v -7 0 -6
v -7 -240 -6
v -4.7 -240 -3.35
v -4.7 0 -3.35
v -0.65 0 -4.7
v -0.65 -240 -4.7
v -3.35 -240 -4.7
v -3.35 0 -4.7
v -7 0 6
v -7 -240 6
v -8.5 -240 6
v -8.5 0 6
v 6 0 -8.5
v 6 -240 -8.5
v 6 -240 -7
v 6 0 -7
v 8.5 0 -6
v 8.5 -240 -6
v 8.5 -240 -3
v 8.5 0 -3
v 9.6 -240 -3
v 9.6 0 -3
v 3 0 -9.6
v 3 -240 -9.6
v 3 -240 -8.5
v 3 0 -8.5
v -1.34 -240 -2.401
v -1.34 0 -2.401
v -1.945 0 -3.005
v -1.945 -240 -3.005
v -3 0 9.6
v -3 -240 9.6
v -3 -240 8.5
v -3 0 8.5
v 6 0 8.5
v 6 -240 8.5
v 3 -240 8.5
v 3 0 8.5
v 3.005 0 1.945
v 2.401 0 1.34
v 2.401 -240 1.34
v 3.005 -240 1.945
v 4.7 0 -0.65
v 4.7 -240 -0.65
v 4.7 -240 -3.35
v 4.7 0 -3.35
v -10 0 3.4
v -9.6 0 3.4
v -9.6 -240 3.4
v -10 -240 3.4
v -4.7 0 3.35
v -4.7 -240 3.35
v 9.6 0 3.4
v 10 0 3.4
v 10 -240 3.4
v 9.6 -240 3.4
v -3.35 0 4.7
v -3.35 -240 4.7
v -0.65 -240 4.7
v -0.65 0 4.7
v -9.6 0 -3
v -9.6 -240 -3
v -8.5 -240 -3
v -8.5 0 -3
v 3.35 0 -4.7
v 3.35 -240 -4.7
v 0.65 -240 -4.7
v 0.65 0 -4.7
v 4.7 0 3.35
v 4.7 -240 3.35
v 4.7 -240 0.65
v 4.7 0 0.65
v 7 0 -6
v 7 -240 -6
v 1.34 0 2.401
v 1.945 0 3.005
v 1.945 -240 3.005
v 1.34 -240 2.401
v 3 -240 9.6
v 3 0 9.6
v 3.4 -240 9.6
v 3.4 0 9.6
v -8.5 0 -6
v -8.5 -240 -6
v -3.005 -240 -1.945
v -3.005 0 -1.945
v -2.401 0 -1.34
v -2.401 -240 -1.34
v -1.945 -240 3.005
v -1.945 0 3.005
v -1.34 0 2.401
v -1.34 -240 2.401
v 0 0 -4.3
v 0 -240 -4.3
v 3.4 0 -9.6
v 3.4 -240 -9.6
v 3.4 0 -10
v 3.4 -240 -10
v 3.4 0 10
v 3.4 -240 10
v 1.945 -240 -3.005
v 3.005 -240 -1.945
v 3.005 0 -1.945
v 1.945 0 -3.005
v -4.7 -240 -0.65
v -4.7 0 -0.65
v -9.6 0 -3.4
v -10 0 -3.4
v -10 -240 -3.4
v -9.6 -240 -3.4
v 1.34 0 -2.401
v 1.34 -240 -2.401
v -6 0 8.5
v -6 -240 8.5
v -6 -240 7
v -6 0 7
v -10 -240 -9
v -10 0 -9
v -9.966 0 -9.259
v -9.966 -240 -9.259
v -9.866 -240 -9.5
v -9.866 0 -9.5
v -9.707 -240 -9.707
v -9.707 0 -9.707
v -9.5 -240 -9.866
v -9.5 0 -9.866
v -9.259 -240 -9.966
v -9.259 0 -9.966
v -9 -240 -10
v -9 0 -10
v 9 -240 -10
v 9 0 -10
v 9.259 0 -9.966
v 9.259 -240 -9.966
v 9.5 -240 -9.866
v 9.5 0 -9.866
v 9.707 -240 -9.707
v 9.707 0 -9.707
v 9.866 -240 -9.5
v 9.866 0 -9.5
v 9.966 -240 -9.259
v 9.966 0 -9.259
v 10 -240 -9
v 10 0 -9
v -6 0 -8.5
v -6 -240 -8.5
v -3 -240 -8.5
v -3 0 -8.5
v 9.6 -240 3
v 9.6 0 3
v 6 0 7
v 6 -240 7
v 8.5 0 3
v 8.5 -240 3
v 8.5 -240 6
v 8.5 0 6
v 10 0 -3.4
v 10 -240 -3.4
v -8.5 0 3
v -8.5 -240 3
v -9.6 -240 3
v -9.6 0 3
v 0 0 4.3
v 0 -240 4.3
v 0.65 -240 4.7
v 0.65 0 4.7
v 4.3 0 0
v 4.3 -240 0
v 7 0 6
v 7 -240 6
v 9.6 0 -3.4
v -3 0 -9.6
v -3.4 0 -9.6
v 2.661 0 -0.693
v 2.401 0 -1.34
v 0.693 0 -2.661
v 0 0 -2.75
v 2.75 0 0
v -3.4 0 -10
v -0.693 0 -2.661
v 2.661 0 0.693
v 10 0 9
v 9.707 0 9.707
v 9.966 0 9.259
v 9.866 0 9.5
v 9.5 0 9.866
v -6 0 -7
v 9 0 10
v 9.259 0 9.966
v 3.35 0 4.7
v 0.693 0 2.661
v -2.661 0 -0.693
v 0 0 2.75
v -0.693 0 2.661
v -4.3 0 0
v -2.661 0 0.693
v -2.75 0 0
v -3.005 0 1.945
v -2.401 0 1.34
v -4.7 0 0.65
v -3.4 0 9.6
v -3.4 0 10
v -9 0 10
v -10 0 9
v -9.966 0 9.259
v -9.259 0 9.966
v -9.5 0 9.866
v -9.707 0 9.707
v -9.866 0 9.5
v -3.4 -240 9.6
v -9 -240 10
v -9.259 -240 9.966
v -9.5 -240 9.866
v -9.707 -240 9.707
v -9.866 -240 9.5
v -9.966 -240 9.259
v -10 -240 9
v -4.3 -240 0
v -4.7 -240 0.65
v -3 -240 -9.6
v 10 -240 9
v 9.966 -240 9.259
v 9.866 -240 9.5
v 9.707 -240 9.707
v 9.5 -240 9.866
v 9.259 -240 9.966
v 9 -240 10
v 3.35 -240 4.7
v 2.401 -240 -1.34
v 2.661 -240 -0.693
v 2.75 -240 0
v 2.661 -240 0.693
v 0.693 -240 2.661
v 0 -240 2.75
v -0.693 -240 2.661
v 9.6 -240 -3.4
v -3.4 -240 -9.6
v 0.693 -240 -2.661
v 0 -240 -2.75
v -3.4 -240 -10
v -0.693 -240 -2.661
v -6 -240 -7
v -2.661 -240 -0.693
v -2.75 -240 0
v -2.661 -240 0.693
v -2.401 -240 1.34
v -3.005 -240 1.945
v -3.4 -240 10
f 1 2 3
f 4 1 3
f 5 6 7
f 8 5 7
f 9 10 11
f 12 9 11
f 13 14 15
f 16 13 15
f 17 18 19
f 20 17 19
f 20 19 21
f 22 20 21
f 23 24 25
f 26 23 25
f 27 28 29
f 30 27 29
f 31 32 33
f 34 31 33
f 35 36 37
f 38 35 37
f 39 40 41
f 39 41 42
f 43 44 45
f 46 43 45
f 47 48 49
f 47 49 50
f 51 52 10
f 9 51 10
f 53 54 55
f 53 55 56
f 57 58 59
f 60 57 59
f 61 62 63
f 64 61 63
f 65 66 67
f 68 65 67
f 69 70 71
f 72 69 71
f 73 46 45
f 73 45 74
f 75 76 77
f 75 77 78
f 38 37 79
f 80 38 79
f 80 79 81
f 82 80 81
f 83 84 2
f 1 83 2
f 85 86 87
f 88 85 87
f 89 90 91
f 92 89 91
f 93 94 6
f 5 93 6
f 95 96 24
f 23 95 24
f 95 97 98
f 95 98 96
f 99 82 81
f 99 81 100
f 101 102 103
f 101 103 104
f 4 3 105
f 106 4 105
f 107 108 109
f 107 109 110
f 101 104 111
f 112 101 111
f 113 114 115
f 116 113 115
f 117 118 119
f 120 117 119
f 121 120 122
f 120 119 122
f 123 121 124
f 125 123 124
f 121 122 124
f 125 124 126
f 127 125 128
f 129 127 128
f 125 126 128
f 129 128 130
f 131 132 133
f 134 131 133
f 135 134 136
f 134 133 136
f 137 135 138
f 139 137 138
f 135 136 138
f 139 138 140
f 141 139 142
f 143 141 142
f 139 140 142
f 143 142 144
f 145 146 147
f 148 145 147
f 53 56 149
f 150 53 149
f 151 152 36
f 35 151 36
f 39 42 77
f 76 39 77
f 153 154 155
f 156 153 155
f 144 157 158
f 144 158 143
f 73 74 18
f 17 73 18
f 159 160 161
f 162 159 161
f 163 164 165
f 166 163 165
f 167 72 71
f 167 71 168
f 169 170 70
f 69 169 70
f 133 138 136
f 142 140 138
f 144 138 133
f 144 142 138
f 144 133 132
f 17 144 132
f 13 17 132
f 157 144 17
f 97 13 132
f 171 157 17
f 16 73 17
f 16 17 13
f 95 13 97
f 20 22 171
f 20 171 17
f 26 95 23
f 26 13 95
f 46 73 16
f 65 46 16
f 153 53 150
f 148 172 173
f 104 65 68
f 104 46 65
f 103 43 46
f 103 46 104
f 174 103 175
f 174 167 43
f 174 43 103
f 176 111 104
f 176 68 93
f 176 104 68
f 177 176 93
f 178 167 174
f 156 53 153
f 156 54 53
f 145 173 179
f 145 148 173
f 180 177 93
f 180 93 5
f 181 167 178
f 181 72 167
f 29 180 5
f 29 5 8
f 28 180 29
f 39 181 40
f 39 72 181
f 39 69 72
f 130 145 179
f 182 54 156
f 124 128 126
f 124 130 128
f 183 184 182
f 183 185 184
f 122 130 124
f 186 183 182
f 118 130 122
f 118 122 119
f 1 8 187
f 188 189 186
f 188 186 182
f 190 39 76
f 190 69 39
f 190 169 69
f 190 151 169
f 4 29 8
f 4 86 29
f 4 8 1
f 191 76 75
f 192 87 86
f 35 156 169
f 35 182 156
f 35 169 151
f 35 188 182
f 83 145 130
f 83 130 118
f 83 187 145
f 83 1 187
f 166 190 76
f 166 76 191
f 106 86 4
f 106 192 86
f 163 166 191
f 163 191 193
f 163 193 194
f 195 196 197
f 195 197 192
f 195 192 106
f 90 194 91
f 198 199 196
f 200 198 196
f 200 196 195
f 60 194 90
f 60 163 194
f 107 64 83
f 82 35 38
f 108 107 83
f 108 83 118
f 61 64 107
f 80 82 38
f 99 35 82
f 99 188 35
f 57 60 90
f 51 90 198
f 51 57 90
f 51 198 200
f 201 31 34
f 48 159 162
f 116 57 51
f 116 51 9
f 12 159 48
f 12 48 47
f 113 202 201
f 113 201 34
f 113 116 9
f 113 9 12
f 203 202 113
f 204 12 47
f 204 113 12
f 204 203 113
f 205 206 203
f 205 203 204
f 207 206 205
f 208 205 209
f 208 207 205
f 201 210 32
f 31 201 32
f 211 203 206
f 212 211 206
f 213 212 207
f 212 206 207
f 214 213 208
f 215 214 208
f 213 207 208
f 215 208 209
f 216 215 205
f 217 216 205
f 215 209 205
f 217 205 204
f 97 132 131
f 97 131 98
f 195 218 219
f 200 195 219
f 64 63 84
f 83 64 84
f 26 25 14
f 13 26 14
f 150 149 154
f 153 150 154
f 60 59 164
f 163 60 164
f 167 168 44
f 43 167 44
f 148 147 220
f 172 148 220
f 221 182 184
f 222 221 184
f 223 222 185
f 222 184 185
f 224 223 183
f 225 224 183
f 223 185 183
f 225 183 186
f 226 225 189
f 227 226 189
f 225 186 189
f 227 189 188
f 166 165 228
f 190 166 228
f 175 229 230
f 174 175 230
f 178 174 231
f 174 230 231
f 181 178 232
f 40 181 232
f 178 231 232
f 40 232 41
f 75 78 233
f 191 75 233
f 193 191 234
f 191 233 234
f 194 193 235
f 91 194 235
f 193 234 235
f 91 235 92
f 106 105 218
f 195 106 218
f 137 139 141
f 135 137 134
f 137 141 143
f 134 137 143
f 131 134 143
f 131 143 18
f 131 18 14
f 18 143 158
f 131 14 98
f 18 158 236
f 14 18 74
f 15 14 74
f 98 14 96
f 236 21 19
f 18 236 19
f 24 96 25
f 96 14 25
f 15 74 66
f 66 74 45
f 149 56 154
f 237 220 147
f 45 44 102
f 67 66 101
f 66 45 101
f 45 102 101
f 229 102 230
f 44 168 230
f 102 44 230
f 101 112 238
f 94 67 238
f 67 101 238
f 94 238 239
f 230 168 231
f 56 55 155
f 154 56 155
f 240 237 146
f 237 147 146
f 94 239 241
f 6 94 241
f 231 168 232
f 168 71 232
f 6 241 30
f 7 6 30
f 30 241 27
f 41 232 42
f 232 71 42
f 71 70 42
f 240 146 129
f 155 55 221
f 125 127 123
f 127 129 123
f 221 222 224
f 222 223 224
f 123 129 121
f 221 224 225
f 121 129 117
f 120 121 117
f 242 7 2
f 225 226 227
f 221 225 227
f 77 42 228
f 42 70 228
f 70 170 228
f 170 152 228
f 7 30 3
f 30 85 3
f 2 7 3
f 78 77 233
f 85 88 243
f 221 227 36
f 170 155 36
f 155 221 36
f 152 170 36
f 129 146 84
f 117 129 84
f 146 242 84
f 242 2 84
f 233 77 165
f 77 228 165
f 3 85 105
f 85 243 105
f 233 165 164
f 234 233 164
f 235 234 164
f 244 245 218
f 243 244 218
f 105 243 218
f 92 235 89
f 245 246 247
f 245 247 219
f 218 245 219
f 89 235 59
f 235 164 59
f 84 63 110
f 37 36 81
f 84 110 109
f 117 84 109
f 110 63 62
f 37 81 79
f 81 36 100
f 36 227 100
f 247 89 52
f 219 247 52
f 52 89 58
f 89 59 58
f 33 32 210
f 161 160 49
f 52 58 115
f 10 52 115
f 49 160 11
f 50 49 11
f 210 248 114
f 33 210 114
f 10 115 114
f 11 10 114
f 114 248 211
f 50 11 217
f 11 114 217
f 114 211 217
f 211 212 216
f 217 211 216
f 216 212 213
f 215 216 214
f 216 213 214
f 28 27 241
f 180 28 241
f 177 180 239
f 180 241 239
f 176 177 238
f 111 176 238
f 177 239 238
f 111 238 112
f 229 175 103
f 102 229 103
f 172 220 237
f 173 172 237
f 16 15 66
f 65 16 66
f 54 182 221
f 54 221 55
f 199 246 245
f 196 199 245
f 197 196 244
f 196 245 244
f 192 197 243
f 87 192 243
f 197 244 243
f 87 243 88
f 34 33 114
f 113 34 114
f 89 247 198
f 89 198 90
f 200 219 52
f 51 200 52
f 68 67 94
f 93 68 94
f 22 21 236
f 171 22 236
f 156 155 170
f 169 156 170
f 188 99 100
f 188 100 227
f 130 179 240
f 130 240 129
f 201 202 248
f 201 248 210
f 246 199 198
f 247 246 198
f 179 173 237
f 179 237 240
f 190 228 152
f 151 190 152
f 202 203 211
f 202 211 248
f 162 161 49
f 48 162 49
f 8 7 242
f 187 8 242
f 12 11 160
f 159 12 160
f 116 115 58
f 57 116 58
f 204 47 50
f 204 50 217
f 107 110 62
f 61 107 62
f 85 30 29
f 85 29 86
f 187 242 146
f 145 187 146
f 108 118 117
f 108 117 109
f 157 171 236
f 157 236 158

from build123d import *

# Parameters (mm, degrees)
PAD_DEPTH          = 240
POCKET_DEPTH       = 380
POLARPATTERN_COUNT = 4
POCKET001_DEPTH    = 380


with BuildPart() as part:
    # Sketch → Pad (new body)
    with BuildSketch(Plane.XZ):
        with BuildLine():
            Line((-9, 10), (9, 10))
            ThreePointArc((10, 9), (9.707107, 9.707107), (9, 10))
            Line((10, 9), (10, -9))
            ThreePointArc((9, -10), (9.707107, -9.707107), (10, -9))
            Line((9, -10), (-9, -10))
            ThreePointArc((-10, -9), (-9.707107, -9.707107), (-9, -10))
            Line((-10, -9), (-10, 9))
            ThreePointArc((-9, 10), (-9.707107, 9.707107), (-10, 9))
        make_face()
    extrude(amount=PAD_DEPTH)

    # Sketch001 (on Face10 of Pad) → Pocket (cut)
    with BuildSketch(Plane.XZ.offset(240)):
        Polygon((-3.4, 10), (-3.4, 9.6), (-3, 9.6), (-3, 8.5), (-6, 8.5), (-6, 7), (-3.35, 4.7), (-0.65, 4.7), (0, 4.3), (0.65, 4.7), (3.35, 4.7), (6, 7), (6, 8.5), (3, 8.5), (3, 9.6), (3.4, 9.6), (3.4, 10), align=None)
    pocket = extrude(amount=-POCKET_DEPTH, mode=Mode.SUBTRACT)

    # PolarPattern: Pocket ×4 about axis
    polarpattern_axis = Axis((0, -240, 0), (0, -1, 0))
    for i in range(1, POLARPATTERN_COUNT):
        add(pocket.rotate(polarpattern_axis, i * 360 / POLARPATTERN_COUNT), mode=Mode.SUBTRACT)

    # Sketch002 (on Face4 of PolarPattern) → Pocket001 (cut)
    with BuildSketch(Plane.XZ.offset(240)):
        with BuildLine():
            ThreePointArc((1.340499, 2.401159), (0, 2.75), (-1.340499, 2.401159))
            Line((-1.944544, 3.005204), (-1.340499, 2.401159))
            Line((-3.005204, 1.944544), (-1.944544, 3.005204))
            Line((-2.401159, 1.340499), (-3.005204, 1.944544))
            ThreePointArc((-2.401159, 1.340499), (-2.75, 0), (-2.401159, -1.340499))
            Line((-3.005204, -1.944544), (-2.401159, -1.340499))
            Line((-1.944544, -3.005204), (-3.005204, -1.944544))
            Line((-1.340499, -2.401159), (-1.944544, -3.005204))
            ThreePointArc((-1.340499, -2.401159), (0, -2.75), (1.340499, -2.401159))
            Line((1.944544, -3.005204), (1.340499, -2.401159))
            Line((3.005204, -1.944544), (1.944544, -3.005204))
            Line((2.401159, -1.340499), (3.005204, -1.944544))
            ThreePointArc((2.401159, -1.340499), (2.75, 0), (2.401159, 1.340499))
            Line((2.401159, 1.340499), (3.005204, 1.944544))
            Line((3.005204, 1.944544), (1.944544, 3.005204))
            Line((1.944544, 3.005204), (1.340499, 2.401159))
        make_face()
    extrude(amount=-POCKET001_DEPTH, mode=Mode.SUBTRACT)


solid = part.part
